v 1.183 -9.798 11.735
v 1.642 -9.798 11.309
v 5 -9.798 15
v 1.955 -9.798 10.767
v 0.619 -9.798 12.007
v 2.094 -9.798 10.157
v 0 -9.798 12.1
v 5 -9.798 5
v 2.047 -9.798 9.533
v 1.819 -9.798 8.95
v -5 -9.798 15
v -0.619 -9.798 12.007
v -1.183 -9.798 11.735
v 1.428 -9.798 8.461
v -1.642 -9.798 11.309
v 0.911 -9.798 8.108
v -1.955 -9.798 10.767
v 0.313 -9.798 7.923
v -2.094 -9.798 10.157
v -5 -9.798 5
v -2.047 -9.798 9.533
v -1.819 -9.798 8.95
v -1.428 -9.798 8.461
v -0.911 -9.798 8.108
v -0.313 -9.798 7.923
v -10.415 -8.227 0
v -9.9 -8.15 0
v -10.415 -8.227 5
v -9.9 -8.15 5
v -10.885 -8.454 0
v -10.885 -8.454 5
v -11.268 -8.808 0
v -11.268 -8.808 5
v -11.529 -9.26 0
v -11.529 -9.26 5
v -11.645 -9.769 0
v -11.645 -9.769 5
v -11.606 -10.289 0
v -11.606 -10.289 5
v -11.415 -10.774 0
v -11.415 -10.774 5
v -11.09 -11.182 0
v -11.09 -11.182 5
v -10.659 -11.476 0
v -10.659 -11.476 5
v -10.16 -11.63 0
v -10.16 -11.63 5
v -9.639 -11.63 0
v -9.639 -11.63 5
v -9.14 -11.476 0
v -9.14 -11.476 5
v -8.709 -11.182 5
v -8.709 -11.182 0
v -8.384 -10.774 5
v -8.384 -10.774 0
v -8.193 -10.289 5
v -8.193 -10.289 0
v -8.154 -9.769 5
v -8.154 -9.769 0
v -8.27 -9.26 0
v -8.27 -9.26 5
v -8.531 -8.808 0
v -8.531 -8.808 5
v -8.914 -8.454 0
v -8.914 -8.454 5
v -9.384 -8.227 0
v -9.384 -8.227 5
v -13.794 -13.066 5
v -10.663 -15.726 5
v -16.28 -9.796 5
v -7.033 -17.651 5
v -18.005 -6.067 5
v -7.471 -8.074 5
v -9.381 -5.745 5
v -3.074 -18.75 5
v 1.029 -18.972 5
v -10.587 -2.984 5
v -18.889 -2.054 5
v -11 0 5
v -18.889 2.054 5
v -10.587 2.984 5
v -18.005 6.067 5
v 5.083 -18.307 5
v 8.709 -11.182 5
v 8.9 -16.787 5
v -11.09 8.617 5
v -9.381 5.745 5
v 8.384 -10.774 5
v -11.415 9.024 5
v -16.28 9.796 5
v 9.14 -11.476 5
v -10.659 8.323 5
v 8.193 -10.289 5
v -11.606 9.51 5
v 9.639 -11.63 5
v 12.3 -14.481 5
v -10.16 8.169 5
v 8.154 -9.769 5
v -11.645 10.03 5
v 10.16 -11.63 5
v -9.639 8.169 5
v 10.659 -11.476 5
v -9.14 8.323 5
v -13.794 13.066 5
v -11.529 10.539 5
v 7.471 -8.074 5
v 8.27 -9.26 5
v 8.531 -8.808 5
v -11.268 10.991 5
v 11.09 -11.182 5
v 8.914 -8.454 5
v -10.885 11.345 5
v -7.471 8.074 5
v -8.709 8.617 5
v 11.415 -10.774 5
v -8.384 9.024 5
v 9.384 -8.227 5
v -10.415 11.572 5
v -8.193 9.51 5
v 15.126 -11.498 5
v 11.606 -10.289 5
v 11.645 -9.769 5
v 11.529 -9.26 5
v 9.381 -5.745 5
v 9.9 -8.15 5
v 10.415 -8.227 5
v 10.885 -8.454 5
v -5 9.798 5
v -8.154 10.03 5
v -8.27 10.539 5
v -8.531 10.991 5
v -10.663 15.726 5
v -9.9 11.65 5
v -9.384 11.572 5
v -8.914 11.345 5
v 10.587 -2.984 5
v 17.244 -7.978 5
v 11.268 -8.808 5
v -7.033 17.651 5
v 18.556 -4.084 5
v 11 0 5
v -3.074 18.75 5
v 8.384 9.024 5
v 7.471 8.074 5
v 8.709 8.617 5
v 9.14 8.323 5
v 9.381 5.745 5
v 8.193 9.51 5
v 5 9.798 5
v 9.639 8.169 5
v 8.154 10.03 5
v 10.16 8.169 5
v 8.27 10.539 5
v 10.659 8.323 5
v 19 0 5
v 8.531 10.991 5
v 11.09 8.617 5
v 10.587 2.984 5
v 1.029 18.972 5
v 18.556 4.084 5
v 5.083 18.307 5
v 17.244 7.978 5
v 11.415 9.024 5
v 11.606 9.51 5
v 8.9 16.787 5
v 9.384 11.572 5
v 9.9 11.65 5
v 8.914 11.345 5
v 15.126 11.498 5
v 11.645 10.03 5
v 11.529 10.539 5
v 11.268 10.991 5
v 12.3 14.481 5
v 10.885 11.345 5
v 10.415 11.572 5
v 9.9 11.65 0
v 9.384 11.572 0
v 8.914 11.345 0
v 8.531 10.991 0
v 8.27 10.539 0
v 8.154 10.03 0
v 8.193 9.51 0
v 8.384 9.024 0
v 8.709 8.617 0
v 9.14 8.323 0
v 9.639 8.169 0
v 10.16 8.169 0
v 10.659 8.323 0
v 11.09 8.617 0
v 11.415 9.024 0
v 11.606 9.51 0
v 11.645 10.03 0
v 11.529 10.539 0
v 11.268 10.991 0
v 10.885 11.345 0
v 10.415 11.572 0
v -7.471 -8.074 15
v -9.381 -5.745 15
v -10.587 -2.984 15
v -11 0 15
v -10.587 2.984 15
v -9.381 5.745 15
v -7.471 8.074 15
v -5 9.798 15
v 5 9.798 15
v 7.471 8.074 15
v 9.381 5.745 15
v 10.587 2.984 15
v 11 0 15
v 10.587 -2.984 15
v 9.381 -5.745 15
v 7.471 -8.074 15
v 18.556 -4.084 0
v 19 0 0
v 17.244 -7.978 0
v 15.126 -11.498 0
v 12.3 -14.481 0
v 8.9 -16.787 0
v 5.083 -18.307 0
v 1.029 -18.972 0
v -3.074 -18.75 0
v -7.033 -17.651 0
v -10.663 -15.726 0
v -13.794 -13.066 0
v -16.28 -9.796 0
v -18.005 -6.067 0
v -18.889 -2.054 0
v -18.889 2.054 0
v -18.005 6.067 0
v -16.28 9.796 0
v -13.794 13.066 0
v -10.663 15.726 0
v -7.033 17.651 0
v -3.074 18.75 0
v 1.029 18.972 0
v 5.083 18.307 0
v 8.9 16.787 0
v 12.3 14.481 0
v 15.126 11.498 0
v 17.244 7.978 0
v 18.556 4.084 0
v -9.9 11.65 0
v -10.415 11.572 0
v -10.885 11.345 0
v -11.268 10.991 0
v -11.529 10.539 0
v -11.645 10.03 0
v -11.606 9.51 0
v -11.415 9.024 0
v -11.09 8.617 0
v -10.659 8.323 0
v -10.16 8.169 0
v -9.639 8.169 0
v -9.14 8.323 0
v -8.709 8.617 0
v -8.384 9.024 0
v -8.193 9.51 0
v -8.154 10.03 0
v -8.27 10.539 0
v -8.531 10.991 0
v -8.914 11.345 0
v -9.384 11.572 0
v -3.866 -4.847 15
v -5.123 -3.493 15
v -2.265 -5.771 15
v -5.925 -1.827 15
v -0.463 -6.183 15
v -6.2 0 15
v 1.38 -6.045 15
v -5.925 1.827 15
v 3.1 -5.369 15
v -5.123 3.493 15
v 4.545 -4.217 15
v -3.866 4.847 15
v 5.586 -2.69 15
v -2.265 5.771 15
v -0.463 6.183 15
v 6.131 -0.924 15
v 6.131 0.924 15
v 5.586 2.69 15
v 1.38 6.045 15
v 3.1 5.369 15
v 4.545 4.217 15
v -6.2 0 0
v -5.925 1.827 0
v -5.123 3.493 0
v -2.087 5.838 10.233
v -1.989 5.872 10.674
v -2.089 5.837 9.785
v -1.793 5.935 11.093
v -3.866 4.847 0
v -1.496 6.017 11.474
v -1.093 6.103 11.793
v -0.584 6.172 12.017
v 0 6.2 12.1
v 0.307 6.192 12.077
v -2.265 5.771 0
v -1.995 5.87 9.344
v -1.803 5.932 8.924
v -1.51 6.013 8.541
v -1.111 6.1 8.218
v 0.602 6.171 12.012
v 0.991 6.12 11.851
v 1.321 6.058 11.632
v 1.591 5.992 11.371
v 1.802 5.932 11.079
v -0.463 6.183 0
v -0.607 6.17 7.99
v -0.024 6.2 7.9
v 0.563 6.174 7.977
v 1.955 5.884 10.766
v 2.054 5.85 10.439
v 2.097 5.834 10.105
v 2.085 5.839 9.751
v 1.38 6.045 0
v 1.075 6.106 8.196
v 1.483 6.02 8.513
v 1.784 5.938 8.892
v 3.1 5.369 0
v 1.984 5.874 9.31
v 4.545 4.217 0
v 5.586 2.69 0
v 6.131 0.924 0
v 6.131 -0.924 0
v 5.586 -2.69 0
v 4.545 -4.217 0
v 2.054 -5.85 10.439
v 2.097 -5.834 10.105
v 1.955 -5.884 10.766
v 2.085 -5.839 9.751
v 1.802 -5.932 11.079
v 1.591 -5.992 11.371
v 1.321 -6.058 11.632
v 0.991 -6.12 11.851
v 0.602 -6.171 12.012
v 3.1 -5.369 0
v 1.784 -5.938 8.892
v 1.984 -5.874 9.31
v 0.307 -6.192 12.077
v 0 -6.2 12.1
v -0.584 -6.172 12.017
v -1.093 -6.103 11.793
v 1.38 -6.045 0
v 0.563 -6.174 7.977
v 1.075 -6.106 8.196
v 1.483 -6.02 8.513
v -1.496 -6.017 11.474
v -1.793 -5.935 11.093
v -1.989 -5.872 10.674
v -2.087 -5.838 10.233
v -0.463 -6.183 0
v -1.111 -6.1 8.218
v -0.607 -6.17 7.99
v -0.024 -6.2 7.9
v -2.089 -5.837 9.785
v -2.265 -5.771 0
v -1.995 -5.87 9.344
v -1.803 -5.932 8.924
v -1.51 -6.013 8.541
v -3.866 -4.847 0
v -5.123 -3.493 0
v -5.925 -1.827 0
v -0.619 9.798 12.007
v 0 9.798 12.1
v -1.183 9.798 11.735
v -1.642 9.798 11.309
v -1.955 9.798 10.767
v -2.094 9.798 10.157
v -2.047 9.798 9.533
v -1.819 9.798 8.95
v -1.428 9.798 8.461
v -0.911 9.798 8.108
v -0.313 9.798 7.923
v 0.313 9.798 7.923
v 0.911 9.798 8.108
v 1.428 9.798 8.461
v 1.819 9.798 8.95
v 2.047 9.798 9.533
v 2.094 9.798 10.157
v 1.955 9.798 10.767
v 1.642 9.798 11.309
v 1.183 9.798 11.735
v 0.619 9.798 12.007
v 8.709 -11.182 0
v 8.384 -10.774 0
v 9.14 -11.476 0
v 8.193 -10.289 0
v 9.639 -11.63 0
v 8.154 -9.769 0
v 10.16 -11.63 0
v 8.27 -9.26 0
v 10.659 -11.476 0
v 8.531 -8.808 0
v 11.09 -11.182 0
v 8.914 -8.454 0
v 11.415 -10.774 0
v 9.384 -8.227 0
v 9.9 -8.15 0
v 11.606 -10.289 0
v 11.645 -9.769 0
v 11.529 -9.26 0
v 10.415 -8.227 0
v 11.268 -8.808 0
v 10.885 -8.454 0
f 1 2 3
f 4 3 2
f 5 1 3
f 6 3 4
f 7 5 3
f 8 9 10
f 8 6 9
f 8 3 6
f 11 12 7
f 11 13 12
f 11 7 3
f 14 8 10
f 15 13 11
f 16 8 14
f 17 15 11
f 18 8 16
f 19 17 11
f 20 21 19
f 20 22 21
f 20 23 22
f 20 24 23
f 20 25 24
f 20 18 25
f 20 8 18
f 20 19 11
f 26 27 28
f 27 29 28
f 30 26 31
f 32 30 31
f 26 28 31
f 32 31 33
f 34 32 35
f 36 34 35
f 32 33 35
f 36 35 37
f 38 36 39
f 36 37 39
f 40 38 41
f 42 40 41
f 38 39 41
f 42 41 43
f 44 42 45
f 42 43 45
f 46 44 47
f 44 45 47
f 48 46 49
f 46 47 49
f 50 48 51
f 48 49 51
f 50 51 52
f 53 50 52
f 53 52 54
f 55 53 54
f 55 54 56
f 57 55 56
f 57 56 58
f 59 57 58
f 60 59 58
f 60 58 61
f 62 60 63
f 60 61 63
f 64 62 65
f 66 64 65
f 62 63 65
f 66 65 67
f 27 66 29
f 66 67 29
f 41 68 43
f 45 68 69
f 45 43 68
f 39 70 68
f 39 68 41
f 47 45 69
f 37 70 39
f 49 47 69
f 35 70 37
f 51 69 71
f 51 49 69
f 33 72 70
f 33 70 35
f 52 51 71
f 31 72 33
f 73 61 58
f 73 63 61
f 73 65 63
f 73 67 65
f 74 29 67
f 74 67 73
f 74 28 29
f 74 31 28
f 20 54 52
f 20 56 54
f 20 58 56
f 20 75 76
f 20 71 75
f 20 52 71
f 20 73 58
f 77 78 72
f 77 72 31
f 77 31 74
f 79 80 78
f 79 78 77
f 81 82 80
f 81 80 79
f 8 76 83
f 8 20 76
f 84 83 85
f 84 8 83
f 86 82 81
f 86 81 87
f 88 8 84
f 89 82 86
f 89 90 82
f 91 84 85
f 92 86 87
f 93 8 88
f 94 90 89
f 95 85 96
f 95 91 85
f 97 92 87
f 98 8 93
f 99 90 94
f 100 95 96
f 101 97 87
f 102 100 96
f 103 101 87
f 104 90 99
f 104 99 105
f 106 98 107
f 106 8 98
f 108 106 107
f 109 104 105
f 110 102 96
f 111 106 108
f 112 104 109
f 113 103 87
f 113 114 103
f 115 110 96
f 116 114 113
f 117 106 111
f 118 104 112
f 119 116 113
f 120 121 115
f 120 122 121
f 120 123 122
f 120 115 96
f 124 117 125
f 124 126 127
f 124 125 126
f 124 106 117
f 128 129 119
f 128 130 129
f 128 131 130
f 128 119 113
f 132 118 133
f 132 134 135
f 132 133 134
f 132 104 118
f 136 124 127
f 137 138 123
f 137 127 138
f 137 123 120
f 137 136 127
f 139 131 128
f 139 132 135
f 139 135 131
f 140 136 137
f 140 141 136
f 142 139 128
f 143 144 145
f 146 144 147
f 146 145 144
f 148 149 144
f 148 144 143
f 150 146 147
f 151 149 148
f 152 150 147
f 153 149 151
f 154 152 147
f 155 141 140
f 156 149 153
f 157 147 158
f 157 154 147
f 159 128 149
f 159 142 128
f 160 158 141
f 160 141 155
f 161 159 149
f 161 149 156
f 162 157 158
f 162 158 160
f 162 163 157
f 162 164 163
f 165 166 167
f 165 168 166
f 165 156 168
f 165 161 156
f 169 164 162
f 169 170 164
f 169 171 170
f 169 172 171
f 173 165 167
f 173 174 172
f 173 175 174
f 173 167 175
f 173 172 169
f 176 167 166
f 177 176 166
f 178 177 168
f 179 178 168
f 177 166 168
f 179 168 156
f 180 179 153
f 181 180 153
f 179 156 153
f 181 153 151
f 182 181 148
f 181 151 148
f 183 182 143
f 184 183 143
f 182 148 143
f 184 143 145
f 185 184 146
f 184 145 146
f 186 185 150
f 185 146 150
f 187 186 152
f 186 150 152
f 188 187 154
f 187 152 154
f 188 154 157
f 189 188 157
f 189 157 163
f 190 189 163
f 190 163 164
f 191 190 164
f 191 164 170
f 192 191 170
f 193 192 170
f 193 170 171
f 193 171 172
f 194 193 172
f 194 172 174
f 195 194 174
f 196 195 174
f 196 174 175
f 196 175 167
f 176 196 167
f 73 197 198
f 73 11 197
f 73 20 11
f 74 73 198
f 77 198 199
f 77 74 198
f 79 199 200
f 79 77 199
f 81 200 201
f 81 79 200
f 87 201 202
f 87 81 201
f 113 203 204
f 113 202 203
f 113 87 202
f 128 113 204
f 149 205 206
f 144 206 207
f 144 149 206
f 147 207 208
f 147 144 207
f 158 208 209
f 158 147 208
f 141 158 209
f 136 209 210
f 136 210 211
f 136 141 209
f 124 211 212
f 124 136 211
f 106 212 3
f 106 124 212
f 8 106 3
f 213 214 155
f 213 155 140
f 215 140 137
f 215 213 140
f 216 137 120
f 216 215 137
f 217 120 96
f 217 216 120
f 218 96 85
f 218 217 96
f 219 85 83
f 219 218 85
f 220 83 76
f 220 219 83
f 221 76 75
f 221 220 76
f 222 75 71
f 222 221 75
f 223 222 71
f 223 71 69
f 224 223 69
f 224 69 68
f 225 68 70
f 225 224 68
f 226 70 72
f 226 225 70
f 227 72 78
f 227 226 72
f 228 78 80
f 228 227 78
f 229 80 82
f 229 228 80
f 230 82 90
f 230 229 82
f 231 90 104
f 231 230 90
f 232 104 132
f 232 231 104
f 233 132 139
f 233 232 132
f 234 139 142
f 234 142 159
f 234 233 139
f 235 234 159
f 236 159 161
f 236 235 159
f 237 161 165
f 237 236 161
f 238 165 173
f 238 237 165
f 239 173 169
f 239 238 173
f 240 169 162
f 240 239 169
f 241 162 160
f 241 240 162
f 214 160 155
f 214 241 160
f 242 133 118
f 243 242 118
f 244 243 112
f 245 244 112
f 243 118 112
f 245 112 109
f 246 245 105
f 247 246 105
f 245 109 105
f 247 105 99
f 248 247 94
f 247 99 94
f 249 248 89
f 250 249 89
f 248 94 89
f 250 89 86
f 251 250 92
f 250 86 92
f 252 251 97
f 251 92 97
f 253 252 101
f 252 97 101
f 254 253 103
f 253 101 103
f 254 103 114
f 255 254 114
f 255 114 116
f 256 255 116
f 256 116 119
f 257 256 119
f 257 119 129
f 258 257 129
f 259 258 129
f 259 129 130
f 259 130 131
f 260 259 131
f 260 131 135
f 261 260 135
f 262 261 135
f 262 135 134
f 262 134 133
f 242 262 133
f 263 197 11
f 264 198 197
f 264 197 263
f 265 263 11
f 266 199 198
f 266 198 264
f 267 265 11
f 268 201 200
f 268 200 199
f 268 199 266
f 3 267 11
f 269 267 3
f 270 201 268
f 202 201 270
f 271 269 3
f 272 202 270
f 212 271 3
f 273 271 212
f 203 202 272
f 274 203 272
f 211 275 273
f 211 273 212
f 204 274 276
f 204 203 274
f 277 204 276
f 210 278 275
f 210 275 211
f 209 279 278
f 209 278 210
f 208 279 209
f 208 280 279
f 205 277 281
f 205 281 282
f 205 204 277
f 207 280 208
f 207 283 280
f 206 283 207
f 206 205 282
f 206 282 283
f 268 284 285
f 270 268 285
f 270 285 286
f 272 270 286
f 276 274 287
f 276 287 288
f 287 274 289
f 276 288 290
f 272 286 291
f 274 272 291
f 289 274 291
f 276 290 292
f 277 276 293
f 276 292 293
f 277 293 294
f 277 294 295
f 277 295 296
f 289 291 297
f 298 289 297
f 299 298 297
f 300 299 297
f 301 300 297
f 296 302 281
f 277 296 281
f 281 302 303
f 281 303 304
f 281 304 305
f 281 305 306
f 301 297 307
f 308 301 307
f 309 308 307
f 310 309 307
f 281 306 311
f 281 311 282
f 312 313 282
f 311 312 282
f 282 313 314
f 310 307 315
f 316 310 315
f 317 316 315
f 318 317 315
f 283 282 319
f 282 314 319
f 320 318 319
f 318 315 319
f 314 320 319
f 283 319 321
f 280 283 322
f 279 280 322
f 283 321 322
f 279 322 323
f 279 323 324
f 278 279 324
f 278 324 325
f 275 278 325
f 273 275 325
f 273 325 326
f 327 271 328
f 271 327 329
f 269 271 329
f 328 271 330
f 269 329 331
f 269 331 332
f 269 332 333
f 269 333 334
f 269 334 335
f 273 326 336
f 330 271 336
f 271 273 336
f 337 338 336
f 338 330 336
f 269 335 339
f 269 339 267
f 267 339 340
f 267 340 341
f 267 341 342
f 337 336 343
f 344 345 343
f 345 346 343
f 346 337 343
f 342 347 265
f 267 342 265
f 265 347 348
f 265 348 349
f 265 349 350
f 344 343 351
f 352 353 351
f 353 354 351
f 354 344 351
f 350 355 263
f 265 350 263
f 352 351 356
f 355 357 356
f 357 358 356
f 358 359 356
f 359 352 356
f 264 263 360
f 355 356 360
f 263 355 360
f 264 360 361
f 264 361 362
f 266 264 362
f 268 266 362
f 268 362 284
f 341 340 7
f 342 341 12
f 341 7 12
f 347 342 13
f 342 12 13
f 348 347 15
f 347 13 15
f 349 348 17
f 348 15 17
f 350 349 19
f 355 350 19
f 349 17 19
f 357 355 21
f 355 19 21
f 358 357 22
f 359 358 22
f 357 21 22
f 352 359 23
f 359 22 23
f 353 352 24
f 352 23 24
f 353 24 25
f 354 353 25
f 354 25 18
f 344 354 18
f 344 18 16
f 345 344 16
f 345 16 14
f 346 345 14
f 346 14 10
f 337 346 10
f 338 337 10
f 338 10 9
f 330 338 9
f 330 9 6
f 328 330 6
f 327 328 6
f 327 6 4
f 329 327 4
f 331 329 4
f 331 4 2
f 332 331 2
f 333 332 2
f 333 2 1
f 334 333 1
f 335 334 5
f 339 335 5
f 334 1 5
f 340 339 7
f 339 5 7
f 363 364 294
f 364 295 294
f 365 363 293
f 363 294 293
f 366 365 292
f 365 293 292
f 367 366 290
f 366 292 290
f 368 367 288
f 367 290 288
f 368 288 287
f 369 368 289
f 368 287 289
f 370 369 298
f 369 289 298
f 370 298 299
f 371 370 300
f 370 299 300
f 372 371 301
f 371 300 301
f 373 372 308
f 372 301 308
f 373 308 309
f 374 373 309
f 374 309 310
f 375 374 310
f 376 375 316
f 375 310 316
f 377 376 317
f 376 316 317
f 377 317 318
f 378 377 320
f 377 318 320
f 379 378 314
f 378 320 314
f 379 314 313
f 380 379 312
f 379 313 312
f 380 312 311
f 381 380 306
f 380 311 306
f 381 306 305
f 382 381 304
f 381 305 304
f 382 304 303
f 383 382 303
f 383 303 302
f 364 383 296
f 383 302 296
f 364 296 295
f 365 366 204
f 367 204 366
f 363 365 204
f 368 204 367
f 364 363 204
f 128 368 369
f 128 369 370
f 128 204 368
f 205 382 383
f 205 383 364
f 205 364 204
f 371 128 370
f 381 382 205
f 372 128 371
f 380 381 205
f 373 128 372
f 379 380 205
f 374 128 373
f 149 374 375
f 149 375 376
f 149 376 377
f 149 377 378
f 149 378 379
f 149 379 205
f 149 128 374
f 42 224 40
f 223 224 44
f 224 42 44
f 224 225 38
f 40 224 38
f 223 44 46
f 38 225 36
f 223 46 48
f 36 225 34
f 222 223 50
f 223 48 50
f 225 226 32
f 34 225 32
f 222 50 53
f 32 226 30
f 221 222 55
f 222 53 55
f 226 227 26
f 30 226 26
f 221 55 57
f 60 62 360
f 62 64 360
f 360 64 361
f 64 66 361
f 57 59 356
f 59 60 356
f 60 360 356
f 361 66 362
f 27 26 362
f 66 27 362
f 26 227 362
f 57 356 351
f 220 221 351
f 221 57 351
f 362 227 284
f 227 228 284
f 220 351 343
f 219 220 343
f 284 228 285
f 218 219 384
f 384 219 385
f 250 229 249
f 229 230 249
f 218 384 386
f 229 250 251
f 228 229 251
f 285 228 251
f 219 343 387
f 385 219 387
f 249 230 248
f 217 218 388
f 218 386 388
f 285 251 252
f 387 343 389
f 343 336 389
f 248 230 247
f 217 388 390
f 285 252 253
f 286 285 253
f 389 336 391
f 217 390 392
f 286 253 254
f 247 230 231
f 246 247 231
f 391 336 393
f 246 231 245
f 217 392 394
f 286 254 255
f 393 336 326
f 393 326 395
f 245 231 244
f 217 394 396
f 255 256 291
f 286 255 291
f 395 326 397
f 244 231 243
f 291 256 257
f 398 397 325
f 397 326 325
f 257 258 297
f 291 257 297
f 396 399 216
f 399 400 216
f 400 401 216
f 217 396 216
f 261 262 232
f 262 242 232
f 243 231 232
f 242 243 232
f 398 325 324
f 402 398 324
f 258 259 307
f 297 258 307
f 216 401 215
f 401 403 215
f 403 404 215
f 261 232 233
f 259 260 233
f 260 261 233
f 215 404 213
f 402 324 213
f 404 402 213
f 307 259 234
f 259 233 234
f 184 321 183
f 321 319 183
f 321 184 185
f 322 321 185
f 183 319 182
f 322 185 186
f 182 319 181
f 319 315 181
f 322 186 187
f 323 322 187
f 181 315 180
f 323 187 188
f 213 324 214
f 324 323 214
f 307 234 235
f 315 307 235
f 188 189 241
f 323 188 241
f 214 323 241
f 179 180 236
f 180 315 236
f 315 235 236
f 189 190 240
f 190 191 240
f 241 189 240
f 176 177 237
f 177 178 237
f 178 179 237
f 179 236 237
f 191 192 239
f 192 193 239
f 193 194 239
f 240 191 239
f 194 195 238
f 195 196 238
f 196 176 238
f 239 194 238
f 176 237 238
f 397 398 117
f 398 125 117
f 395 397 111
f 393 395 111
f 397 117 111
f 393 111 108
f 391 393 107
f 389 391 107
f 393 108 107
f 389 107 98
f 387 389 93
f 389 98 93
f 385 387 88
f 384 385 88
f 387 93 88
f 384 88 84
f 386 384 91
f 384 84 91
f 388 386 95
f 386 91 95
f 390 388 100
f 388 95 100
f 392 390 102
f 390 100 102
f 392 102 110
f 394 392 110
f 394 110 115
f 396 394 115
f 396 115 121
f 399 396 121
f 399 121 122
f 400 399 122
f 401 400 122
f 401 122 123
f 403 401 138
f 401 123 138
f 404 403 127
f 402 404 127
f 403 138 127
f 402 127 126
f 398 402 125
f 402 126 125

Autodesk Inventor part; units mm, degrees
ref_plane "YZ Plane" through (0, 0, 0) normal (1, 0, 0) x (0, 1, 0)
ref_plane "XZ Plane" through (0, 0, 0) normal (0, 1, 0) x (-1, 0, 0)
ref_plane "XY Plane" through (0, 0, 0) normal (0, 0, 1) x (1, 0, 0)
sketch "スケッチ1" plane through (0, 0, 0) normal (0, 0, 1) x (1, 0, 0)
  circle A0 centre (0, 0) radius 19
  circle A1 centre (0, 0) radius 14
  circle A2 centre (-14, 0) radius 1.75
  circle A3 centre (0, -14) radius 1.75
  circle A4 centre (14, 0) radius 1.75
  circle A5 centre (0, 14) radius 1.75
  line L0 (-19, 0) -> (19, 0)
  dimension "d10" = 28
  dimension "d0" = 38
  dimension "d11" = 3.5
  dimension "d14" = 360
extrude "押し出し1" add sketch "スケッチ1" along normal blind 5
sketch "スケッチ2" plane through (0, 0, 5) normal (0, 0, 1) x (1, 0, 0)
  circle A0 centre (0, 0) radius 11
  line L0 (5, -9.798) -> (-5, -9.798)
  line L1 (-5, -9.798) -> (-5, 9.798)
  line L2 (-5, 9.798) -> (5, 9.798)
  line L3 (5, 9.798) -> (5, -9.798)
  line L4 (5, -9.798) -> (-5, 9.798) construction
  line L5 (-5, -9.798) -> (5, 9.798) construction
  dimension "d3" = 22
  dimension "d6" = 10
extrude "押し出し2" add sketch "スケッチ2" along normal blind 10 contours A0 L3 | L3 L0 L1 L2 | L1 A0
sketch "スケッチ3" plane through (0, 0, 0) normal (0, 0, -1) x (-1, 0, 0)
  circle A0 centre (0, 0) radius 6.2
  dimension "d7" = 12.4
extrude "押し出し3" cut sketch "スケッチ3" against normal blind 30
sketch "スケッチ4" plane through (0, 0, 0) normal (0, 0, -1) x (-1, 0, 0)
  circle A0 centre (0, 0) radius 14
  point P0 (-14, 0)
  point P1 (-9.8995, -9.8995)
  point P2 (0, -14)
  point P3 (9.8995, -9.8995)
  point P4 (14, 0)
  point P5 (9.8995, 9.8995)
  point P6 (0, 14)
  point P7 (-9.8995, 9.8995)
  dimension "d16" = 28
  dimension "d33" = 360
hole "穴1" at (9.8995, -9.8995, 0) at (9.8995, 9.8995, 0) at (-9.8995, 9.8995, 0) at (-9.8995, -9.8995, 0) direction (0, 0, 1) diameter 3.5 end through all
sketch "スケッチ5" plane through (-5, 9.798, 5) normal (0, 1, 0) x (1, 0, 0)
  line L0 (10, -10) -> (0, -10) projected
  line L1 (5, -10) -> (5, 0)
  line L2 (0, 0) -> (10, 0) projected
  point P0 (5, 5)
  point P1 (5, -5)
hole "穴2" at (0, 9.798, 10) direction (0, -1, 0) diameter 4.2 end through all
properties part number "light_tire_fixer_10"
